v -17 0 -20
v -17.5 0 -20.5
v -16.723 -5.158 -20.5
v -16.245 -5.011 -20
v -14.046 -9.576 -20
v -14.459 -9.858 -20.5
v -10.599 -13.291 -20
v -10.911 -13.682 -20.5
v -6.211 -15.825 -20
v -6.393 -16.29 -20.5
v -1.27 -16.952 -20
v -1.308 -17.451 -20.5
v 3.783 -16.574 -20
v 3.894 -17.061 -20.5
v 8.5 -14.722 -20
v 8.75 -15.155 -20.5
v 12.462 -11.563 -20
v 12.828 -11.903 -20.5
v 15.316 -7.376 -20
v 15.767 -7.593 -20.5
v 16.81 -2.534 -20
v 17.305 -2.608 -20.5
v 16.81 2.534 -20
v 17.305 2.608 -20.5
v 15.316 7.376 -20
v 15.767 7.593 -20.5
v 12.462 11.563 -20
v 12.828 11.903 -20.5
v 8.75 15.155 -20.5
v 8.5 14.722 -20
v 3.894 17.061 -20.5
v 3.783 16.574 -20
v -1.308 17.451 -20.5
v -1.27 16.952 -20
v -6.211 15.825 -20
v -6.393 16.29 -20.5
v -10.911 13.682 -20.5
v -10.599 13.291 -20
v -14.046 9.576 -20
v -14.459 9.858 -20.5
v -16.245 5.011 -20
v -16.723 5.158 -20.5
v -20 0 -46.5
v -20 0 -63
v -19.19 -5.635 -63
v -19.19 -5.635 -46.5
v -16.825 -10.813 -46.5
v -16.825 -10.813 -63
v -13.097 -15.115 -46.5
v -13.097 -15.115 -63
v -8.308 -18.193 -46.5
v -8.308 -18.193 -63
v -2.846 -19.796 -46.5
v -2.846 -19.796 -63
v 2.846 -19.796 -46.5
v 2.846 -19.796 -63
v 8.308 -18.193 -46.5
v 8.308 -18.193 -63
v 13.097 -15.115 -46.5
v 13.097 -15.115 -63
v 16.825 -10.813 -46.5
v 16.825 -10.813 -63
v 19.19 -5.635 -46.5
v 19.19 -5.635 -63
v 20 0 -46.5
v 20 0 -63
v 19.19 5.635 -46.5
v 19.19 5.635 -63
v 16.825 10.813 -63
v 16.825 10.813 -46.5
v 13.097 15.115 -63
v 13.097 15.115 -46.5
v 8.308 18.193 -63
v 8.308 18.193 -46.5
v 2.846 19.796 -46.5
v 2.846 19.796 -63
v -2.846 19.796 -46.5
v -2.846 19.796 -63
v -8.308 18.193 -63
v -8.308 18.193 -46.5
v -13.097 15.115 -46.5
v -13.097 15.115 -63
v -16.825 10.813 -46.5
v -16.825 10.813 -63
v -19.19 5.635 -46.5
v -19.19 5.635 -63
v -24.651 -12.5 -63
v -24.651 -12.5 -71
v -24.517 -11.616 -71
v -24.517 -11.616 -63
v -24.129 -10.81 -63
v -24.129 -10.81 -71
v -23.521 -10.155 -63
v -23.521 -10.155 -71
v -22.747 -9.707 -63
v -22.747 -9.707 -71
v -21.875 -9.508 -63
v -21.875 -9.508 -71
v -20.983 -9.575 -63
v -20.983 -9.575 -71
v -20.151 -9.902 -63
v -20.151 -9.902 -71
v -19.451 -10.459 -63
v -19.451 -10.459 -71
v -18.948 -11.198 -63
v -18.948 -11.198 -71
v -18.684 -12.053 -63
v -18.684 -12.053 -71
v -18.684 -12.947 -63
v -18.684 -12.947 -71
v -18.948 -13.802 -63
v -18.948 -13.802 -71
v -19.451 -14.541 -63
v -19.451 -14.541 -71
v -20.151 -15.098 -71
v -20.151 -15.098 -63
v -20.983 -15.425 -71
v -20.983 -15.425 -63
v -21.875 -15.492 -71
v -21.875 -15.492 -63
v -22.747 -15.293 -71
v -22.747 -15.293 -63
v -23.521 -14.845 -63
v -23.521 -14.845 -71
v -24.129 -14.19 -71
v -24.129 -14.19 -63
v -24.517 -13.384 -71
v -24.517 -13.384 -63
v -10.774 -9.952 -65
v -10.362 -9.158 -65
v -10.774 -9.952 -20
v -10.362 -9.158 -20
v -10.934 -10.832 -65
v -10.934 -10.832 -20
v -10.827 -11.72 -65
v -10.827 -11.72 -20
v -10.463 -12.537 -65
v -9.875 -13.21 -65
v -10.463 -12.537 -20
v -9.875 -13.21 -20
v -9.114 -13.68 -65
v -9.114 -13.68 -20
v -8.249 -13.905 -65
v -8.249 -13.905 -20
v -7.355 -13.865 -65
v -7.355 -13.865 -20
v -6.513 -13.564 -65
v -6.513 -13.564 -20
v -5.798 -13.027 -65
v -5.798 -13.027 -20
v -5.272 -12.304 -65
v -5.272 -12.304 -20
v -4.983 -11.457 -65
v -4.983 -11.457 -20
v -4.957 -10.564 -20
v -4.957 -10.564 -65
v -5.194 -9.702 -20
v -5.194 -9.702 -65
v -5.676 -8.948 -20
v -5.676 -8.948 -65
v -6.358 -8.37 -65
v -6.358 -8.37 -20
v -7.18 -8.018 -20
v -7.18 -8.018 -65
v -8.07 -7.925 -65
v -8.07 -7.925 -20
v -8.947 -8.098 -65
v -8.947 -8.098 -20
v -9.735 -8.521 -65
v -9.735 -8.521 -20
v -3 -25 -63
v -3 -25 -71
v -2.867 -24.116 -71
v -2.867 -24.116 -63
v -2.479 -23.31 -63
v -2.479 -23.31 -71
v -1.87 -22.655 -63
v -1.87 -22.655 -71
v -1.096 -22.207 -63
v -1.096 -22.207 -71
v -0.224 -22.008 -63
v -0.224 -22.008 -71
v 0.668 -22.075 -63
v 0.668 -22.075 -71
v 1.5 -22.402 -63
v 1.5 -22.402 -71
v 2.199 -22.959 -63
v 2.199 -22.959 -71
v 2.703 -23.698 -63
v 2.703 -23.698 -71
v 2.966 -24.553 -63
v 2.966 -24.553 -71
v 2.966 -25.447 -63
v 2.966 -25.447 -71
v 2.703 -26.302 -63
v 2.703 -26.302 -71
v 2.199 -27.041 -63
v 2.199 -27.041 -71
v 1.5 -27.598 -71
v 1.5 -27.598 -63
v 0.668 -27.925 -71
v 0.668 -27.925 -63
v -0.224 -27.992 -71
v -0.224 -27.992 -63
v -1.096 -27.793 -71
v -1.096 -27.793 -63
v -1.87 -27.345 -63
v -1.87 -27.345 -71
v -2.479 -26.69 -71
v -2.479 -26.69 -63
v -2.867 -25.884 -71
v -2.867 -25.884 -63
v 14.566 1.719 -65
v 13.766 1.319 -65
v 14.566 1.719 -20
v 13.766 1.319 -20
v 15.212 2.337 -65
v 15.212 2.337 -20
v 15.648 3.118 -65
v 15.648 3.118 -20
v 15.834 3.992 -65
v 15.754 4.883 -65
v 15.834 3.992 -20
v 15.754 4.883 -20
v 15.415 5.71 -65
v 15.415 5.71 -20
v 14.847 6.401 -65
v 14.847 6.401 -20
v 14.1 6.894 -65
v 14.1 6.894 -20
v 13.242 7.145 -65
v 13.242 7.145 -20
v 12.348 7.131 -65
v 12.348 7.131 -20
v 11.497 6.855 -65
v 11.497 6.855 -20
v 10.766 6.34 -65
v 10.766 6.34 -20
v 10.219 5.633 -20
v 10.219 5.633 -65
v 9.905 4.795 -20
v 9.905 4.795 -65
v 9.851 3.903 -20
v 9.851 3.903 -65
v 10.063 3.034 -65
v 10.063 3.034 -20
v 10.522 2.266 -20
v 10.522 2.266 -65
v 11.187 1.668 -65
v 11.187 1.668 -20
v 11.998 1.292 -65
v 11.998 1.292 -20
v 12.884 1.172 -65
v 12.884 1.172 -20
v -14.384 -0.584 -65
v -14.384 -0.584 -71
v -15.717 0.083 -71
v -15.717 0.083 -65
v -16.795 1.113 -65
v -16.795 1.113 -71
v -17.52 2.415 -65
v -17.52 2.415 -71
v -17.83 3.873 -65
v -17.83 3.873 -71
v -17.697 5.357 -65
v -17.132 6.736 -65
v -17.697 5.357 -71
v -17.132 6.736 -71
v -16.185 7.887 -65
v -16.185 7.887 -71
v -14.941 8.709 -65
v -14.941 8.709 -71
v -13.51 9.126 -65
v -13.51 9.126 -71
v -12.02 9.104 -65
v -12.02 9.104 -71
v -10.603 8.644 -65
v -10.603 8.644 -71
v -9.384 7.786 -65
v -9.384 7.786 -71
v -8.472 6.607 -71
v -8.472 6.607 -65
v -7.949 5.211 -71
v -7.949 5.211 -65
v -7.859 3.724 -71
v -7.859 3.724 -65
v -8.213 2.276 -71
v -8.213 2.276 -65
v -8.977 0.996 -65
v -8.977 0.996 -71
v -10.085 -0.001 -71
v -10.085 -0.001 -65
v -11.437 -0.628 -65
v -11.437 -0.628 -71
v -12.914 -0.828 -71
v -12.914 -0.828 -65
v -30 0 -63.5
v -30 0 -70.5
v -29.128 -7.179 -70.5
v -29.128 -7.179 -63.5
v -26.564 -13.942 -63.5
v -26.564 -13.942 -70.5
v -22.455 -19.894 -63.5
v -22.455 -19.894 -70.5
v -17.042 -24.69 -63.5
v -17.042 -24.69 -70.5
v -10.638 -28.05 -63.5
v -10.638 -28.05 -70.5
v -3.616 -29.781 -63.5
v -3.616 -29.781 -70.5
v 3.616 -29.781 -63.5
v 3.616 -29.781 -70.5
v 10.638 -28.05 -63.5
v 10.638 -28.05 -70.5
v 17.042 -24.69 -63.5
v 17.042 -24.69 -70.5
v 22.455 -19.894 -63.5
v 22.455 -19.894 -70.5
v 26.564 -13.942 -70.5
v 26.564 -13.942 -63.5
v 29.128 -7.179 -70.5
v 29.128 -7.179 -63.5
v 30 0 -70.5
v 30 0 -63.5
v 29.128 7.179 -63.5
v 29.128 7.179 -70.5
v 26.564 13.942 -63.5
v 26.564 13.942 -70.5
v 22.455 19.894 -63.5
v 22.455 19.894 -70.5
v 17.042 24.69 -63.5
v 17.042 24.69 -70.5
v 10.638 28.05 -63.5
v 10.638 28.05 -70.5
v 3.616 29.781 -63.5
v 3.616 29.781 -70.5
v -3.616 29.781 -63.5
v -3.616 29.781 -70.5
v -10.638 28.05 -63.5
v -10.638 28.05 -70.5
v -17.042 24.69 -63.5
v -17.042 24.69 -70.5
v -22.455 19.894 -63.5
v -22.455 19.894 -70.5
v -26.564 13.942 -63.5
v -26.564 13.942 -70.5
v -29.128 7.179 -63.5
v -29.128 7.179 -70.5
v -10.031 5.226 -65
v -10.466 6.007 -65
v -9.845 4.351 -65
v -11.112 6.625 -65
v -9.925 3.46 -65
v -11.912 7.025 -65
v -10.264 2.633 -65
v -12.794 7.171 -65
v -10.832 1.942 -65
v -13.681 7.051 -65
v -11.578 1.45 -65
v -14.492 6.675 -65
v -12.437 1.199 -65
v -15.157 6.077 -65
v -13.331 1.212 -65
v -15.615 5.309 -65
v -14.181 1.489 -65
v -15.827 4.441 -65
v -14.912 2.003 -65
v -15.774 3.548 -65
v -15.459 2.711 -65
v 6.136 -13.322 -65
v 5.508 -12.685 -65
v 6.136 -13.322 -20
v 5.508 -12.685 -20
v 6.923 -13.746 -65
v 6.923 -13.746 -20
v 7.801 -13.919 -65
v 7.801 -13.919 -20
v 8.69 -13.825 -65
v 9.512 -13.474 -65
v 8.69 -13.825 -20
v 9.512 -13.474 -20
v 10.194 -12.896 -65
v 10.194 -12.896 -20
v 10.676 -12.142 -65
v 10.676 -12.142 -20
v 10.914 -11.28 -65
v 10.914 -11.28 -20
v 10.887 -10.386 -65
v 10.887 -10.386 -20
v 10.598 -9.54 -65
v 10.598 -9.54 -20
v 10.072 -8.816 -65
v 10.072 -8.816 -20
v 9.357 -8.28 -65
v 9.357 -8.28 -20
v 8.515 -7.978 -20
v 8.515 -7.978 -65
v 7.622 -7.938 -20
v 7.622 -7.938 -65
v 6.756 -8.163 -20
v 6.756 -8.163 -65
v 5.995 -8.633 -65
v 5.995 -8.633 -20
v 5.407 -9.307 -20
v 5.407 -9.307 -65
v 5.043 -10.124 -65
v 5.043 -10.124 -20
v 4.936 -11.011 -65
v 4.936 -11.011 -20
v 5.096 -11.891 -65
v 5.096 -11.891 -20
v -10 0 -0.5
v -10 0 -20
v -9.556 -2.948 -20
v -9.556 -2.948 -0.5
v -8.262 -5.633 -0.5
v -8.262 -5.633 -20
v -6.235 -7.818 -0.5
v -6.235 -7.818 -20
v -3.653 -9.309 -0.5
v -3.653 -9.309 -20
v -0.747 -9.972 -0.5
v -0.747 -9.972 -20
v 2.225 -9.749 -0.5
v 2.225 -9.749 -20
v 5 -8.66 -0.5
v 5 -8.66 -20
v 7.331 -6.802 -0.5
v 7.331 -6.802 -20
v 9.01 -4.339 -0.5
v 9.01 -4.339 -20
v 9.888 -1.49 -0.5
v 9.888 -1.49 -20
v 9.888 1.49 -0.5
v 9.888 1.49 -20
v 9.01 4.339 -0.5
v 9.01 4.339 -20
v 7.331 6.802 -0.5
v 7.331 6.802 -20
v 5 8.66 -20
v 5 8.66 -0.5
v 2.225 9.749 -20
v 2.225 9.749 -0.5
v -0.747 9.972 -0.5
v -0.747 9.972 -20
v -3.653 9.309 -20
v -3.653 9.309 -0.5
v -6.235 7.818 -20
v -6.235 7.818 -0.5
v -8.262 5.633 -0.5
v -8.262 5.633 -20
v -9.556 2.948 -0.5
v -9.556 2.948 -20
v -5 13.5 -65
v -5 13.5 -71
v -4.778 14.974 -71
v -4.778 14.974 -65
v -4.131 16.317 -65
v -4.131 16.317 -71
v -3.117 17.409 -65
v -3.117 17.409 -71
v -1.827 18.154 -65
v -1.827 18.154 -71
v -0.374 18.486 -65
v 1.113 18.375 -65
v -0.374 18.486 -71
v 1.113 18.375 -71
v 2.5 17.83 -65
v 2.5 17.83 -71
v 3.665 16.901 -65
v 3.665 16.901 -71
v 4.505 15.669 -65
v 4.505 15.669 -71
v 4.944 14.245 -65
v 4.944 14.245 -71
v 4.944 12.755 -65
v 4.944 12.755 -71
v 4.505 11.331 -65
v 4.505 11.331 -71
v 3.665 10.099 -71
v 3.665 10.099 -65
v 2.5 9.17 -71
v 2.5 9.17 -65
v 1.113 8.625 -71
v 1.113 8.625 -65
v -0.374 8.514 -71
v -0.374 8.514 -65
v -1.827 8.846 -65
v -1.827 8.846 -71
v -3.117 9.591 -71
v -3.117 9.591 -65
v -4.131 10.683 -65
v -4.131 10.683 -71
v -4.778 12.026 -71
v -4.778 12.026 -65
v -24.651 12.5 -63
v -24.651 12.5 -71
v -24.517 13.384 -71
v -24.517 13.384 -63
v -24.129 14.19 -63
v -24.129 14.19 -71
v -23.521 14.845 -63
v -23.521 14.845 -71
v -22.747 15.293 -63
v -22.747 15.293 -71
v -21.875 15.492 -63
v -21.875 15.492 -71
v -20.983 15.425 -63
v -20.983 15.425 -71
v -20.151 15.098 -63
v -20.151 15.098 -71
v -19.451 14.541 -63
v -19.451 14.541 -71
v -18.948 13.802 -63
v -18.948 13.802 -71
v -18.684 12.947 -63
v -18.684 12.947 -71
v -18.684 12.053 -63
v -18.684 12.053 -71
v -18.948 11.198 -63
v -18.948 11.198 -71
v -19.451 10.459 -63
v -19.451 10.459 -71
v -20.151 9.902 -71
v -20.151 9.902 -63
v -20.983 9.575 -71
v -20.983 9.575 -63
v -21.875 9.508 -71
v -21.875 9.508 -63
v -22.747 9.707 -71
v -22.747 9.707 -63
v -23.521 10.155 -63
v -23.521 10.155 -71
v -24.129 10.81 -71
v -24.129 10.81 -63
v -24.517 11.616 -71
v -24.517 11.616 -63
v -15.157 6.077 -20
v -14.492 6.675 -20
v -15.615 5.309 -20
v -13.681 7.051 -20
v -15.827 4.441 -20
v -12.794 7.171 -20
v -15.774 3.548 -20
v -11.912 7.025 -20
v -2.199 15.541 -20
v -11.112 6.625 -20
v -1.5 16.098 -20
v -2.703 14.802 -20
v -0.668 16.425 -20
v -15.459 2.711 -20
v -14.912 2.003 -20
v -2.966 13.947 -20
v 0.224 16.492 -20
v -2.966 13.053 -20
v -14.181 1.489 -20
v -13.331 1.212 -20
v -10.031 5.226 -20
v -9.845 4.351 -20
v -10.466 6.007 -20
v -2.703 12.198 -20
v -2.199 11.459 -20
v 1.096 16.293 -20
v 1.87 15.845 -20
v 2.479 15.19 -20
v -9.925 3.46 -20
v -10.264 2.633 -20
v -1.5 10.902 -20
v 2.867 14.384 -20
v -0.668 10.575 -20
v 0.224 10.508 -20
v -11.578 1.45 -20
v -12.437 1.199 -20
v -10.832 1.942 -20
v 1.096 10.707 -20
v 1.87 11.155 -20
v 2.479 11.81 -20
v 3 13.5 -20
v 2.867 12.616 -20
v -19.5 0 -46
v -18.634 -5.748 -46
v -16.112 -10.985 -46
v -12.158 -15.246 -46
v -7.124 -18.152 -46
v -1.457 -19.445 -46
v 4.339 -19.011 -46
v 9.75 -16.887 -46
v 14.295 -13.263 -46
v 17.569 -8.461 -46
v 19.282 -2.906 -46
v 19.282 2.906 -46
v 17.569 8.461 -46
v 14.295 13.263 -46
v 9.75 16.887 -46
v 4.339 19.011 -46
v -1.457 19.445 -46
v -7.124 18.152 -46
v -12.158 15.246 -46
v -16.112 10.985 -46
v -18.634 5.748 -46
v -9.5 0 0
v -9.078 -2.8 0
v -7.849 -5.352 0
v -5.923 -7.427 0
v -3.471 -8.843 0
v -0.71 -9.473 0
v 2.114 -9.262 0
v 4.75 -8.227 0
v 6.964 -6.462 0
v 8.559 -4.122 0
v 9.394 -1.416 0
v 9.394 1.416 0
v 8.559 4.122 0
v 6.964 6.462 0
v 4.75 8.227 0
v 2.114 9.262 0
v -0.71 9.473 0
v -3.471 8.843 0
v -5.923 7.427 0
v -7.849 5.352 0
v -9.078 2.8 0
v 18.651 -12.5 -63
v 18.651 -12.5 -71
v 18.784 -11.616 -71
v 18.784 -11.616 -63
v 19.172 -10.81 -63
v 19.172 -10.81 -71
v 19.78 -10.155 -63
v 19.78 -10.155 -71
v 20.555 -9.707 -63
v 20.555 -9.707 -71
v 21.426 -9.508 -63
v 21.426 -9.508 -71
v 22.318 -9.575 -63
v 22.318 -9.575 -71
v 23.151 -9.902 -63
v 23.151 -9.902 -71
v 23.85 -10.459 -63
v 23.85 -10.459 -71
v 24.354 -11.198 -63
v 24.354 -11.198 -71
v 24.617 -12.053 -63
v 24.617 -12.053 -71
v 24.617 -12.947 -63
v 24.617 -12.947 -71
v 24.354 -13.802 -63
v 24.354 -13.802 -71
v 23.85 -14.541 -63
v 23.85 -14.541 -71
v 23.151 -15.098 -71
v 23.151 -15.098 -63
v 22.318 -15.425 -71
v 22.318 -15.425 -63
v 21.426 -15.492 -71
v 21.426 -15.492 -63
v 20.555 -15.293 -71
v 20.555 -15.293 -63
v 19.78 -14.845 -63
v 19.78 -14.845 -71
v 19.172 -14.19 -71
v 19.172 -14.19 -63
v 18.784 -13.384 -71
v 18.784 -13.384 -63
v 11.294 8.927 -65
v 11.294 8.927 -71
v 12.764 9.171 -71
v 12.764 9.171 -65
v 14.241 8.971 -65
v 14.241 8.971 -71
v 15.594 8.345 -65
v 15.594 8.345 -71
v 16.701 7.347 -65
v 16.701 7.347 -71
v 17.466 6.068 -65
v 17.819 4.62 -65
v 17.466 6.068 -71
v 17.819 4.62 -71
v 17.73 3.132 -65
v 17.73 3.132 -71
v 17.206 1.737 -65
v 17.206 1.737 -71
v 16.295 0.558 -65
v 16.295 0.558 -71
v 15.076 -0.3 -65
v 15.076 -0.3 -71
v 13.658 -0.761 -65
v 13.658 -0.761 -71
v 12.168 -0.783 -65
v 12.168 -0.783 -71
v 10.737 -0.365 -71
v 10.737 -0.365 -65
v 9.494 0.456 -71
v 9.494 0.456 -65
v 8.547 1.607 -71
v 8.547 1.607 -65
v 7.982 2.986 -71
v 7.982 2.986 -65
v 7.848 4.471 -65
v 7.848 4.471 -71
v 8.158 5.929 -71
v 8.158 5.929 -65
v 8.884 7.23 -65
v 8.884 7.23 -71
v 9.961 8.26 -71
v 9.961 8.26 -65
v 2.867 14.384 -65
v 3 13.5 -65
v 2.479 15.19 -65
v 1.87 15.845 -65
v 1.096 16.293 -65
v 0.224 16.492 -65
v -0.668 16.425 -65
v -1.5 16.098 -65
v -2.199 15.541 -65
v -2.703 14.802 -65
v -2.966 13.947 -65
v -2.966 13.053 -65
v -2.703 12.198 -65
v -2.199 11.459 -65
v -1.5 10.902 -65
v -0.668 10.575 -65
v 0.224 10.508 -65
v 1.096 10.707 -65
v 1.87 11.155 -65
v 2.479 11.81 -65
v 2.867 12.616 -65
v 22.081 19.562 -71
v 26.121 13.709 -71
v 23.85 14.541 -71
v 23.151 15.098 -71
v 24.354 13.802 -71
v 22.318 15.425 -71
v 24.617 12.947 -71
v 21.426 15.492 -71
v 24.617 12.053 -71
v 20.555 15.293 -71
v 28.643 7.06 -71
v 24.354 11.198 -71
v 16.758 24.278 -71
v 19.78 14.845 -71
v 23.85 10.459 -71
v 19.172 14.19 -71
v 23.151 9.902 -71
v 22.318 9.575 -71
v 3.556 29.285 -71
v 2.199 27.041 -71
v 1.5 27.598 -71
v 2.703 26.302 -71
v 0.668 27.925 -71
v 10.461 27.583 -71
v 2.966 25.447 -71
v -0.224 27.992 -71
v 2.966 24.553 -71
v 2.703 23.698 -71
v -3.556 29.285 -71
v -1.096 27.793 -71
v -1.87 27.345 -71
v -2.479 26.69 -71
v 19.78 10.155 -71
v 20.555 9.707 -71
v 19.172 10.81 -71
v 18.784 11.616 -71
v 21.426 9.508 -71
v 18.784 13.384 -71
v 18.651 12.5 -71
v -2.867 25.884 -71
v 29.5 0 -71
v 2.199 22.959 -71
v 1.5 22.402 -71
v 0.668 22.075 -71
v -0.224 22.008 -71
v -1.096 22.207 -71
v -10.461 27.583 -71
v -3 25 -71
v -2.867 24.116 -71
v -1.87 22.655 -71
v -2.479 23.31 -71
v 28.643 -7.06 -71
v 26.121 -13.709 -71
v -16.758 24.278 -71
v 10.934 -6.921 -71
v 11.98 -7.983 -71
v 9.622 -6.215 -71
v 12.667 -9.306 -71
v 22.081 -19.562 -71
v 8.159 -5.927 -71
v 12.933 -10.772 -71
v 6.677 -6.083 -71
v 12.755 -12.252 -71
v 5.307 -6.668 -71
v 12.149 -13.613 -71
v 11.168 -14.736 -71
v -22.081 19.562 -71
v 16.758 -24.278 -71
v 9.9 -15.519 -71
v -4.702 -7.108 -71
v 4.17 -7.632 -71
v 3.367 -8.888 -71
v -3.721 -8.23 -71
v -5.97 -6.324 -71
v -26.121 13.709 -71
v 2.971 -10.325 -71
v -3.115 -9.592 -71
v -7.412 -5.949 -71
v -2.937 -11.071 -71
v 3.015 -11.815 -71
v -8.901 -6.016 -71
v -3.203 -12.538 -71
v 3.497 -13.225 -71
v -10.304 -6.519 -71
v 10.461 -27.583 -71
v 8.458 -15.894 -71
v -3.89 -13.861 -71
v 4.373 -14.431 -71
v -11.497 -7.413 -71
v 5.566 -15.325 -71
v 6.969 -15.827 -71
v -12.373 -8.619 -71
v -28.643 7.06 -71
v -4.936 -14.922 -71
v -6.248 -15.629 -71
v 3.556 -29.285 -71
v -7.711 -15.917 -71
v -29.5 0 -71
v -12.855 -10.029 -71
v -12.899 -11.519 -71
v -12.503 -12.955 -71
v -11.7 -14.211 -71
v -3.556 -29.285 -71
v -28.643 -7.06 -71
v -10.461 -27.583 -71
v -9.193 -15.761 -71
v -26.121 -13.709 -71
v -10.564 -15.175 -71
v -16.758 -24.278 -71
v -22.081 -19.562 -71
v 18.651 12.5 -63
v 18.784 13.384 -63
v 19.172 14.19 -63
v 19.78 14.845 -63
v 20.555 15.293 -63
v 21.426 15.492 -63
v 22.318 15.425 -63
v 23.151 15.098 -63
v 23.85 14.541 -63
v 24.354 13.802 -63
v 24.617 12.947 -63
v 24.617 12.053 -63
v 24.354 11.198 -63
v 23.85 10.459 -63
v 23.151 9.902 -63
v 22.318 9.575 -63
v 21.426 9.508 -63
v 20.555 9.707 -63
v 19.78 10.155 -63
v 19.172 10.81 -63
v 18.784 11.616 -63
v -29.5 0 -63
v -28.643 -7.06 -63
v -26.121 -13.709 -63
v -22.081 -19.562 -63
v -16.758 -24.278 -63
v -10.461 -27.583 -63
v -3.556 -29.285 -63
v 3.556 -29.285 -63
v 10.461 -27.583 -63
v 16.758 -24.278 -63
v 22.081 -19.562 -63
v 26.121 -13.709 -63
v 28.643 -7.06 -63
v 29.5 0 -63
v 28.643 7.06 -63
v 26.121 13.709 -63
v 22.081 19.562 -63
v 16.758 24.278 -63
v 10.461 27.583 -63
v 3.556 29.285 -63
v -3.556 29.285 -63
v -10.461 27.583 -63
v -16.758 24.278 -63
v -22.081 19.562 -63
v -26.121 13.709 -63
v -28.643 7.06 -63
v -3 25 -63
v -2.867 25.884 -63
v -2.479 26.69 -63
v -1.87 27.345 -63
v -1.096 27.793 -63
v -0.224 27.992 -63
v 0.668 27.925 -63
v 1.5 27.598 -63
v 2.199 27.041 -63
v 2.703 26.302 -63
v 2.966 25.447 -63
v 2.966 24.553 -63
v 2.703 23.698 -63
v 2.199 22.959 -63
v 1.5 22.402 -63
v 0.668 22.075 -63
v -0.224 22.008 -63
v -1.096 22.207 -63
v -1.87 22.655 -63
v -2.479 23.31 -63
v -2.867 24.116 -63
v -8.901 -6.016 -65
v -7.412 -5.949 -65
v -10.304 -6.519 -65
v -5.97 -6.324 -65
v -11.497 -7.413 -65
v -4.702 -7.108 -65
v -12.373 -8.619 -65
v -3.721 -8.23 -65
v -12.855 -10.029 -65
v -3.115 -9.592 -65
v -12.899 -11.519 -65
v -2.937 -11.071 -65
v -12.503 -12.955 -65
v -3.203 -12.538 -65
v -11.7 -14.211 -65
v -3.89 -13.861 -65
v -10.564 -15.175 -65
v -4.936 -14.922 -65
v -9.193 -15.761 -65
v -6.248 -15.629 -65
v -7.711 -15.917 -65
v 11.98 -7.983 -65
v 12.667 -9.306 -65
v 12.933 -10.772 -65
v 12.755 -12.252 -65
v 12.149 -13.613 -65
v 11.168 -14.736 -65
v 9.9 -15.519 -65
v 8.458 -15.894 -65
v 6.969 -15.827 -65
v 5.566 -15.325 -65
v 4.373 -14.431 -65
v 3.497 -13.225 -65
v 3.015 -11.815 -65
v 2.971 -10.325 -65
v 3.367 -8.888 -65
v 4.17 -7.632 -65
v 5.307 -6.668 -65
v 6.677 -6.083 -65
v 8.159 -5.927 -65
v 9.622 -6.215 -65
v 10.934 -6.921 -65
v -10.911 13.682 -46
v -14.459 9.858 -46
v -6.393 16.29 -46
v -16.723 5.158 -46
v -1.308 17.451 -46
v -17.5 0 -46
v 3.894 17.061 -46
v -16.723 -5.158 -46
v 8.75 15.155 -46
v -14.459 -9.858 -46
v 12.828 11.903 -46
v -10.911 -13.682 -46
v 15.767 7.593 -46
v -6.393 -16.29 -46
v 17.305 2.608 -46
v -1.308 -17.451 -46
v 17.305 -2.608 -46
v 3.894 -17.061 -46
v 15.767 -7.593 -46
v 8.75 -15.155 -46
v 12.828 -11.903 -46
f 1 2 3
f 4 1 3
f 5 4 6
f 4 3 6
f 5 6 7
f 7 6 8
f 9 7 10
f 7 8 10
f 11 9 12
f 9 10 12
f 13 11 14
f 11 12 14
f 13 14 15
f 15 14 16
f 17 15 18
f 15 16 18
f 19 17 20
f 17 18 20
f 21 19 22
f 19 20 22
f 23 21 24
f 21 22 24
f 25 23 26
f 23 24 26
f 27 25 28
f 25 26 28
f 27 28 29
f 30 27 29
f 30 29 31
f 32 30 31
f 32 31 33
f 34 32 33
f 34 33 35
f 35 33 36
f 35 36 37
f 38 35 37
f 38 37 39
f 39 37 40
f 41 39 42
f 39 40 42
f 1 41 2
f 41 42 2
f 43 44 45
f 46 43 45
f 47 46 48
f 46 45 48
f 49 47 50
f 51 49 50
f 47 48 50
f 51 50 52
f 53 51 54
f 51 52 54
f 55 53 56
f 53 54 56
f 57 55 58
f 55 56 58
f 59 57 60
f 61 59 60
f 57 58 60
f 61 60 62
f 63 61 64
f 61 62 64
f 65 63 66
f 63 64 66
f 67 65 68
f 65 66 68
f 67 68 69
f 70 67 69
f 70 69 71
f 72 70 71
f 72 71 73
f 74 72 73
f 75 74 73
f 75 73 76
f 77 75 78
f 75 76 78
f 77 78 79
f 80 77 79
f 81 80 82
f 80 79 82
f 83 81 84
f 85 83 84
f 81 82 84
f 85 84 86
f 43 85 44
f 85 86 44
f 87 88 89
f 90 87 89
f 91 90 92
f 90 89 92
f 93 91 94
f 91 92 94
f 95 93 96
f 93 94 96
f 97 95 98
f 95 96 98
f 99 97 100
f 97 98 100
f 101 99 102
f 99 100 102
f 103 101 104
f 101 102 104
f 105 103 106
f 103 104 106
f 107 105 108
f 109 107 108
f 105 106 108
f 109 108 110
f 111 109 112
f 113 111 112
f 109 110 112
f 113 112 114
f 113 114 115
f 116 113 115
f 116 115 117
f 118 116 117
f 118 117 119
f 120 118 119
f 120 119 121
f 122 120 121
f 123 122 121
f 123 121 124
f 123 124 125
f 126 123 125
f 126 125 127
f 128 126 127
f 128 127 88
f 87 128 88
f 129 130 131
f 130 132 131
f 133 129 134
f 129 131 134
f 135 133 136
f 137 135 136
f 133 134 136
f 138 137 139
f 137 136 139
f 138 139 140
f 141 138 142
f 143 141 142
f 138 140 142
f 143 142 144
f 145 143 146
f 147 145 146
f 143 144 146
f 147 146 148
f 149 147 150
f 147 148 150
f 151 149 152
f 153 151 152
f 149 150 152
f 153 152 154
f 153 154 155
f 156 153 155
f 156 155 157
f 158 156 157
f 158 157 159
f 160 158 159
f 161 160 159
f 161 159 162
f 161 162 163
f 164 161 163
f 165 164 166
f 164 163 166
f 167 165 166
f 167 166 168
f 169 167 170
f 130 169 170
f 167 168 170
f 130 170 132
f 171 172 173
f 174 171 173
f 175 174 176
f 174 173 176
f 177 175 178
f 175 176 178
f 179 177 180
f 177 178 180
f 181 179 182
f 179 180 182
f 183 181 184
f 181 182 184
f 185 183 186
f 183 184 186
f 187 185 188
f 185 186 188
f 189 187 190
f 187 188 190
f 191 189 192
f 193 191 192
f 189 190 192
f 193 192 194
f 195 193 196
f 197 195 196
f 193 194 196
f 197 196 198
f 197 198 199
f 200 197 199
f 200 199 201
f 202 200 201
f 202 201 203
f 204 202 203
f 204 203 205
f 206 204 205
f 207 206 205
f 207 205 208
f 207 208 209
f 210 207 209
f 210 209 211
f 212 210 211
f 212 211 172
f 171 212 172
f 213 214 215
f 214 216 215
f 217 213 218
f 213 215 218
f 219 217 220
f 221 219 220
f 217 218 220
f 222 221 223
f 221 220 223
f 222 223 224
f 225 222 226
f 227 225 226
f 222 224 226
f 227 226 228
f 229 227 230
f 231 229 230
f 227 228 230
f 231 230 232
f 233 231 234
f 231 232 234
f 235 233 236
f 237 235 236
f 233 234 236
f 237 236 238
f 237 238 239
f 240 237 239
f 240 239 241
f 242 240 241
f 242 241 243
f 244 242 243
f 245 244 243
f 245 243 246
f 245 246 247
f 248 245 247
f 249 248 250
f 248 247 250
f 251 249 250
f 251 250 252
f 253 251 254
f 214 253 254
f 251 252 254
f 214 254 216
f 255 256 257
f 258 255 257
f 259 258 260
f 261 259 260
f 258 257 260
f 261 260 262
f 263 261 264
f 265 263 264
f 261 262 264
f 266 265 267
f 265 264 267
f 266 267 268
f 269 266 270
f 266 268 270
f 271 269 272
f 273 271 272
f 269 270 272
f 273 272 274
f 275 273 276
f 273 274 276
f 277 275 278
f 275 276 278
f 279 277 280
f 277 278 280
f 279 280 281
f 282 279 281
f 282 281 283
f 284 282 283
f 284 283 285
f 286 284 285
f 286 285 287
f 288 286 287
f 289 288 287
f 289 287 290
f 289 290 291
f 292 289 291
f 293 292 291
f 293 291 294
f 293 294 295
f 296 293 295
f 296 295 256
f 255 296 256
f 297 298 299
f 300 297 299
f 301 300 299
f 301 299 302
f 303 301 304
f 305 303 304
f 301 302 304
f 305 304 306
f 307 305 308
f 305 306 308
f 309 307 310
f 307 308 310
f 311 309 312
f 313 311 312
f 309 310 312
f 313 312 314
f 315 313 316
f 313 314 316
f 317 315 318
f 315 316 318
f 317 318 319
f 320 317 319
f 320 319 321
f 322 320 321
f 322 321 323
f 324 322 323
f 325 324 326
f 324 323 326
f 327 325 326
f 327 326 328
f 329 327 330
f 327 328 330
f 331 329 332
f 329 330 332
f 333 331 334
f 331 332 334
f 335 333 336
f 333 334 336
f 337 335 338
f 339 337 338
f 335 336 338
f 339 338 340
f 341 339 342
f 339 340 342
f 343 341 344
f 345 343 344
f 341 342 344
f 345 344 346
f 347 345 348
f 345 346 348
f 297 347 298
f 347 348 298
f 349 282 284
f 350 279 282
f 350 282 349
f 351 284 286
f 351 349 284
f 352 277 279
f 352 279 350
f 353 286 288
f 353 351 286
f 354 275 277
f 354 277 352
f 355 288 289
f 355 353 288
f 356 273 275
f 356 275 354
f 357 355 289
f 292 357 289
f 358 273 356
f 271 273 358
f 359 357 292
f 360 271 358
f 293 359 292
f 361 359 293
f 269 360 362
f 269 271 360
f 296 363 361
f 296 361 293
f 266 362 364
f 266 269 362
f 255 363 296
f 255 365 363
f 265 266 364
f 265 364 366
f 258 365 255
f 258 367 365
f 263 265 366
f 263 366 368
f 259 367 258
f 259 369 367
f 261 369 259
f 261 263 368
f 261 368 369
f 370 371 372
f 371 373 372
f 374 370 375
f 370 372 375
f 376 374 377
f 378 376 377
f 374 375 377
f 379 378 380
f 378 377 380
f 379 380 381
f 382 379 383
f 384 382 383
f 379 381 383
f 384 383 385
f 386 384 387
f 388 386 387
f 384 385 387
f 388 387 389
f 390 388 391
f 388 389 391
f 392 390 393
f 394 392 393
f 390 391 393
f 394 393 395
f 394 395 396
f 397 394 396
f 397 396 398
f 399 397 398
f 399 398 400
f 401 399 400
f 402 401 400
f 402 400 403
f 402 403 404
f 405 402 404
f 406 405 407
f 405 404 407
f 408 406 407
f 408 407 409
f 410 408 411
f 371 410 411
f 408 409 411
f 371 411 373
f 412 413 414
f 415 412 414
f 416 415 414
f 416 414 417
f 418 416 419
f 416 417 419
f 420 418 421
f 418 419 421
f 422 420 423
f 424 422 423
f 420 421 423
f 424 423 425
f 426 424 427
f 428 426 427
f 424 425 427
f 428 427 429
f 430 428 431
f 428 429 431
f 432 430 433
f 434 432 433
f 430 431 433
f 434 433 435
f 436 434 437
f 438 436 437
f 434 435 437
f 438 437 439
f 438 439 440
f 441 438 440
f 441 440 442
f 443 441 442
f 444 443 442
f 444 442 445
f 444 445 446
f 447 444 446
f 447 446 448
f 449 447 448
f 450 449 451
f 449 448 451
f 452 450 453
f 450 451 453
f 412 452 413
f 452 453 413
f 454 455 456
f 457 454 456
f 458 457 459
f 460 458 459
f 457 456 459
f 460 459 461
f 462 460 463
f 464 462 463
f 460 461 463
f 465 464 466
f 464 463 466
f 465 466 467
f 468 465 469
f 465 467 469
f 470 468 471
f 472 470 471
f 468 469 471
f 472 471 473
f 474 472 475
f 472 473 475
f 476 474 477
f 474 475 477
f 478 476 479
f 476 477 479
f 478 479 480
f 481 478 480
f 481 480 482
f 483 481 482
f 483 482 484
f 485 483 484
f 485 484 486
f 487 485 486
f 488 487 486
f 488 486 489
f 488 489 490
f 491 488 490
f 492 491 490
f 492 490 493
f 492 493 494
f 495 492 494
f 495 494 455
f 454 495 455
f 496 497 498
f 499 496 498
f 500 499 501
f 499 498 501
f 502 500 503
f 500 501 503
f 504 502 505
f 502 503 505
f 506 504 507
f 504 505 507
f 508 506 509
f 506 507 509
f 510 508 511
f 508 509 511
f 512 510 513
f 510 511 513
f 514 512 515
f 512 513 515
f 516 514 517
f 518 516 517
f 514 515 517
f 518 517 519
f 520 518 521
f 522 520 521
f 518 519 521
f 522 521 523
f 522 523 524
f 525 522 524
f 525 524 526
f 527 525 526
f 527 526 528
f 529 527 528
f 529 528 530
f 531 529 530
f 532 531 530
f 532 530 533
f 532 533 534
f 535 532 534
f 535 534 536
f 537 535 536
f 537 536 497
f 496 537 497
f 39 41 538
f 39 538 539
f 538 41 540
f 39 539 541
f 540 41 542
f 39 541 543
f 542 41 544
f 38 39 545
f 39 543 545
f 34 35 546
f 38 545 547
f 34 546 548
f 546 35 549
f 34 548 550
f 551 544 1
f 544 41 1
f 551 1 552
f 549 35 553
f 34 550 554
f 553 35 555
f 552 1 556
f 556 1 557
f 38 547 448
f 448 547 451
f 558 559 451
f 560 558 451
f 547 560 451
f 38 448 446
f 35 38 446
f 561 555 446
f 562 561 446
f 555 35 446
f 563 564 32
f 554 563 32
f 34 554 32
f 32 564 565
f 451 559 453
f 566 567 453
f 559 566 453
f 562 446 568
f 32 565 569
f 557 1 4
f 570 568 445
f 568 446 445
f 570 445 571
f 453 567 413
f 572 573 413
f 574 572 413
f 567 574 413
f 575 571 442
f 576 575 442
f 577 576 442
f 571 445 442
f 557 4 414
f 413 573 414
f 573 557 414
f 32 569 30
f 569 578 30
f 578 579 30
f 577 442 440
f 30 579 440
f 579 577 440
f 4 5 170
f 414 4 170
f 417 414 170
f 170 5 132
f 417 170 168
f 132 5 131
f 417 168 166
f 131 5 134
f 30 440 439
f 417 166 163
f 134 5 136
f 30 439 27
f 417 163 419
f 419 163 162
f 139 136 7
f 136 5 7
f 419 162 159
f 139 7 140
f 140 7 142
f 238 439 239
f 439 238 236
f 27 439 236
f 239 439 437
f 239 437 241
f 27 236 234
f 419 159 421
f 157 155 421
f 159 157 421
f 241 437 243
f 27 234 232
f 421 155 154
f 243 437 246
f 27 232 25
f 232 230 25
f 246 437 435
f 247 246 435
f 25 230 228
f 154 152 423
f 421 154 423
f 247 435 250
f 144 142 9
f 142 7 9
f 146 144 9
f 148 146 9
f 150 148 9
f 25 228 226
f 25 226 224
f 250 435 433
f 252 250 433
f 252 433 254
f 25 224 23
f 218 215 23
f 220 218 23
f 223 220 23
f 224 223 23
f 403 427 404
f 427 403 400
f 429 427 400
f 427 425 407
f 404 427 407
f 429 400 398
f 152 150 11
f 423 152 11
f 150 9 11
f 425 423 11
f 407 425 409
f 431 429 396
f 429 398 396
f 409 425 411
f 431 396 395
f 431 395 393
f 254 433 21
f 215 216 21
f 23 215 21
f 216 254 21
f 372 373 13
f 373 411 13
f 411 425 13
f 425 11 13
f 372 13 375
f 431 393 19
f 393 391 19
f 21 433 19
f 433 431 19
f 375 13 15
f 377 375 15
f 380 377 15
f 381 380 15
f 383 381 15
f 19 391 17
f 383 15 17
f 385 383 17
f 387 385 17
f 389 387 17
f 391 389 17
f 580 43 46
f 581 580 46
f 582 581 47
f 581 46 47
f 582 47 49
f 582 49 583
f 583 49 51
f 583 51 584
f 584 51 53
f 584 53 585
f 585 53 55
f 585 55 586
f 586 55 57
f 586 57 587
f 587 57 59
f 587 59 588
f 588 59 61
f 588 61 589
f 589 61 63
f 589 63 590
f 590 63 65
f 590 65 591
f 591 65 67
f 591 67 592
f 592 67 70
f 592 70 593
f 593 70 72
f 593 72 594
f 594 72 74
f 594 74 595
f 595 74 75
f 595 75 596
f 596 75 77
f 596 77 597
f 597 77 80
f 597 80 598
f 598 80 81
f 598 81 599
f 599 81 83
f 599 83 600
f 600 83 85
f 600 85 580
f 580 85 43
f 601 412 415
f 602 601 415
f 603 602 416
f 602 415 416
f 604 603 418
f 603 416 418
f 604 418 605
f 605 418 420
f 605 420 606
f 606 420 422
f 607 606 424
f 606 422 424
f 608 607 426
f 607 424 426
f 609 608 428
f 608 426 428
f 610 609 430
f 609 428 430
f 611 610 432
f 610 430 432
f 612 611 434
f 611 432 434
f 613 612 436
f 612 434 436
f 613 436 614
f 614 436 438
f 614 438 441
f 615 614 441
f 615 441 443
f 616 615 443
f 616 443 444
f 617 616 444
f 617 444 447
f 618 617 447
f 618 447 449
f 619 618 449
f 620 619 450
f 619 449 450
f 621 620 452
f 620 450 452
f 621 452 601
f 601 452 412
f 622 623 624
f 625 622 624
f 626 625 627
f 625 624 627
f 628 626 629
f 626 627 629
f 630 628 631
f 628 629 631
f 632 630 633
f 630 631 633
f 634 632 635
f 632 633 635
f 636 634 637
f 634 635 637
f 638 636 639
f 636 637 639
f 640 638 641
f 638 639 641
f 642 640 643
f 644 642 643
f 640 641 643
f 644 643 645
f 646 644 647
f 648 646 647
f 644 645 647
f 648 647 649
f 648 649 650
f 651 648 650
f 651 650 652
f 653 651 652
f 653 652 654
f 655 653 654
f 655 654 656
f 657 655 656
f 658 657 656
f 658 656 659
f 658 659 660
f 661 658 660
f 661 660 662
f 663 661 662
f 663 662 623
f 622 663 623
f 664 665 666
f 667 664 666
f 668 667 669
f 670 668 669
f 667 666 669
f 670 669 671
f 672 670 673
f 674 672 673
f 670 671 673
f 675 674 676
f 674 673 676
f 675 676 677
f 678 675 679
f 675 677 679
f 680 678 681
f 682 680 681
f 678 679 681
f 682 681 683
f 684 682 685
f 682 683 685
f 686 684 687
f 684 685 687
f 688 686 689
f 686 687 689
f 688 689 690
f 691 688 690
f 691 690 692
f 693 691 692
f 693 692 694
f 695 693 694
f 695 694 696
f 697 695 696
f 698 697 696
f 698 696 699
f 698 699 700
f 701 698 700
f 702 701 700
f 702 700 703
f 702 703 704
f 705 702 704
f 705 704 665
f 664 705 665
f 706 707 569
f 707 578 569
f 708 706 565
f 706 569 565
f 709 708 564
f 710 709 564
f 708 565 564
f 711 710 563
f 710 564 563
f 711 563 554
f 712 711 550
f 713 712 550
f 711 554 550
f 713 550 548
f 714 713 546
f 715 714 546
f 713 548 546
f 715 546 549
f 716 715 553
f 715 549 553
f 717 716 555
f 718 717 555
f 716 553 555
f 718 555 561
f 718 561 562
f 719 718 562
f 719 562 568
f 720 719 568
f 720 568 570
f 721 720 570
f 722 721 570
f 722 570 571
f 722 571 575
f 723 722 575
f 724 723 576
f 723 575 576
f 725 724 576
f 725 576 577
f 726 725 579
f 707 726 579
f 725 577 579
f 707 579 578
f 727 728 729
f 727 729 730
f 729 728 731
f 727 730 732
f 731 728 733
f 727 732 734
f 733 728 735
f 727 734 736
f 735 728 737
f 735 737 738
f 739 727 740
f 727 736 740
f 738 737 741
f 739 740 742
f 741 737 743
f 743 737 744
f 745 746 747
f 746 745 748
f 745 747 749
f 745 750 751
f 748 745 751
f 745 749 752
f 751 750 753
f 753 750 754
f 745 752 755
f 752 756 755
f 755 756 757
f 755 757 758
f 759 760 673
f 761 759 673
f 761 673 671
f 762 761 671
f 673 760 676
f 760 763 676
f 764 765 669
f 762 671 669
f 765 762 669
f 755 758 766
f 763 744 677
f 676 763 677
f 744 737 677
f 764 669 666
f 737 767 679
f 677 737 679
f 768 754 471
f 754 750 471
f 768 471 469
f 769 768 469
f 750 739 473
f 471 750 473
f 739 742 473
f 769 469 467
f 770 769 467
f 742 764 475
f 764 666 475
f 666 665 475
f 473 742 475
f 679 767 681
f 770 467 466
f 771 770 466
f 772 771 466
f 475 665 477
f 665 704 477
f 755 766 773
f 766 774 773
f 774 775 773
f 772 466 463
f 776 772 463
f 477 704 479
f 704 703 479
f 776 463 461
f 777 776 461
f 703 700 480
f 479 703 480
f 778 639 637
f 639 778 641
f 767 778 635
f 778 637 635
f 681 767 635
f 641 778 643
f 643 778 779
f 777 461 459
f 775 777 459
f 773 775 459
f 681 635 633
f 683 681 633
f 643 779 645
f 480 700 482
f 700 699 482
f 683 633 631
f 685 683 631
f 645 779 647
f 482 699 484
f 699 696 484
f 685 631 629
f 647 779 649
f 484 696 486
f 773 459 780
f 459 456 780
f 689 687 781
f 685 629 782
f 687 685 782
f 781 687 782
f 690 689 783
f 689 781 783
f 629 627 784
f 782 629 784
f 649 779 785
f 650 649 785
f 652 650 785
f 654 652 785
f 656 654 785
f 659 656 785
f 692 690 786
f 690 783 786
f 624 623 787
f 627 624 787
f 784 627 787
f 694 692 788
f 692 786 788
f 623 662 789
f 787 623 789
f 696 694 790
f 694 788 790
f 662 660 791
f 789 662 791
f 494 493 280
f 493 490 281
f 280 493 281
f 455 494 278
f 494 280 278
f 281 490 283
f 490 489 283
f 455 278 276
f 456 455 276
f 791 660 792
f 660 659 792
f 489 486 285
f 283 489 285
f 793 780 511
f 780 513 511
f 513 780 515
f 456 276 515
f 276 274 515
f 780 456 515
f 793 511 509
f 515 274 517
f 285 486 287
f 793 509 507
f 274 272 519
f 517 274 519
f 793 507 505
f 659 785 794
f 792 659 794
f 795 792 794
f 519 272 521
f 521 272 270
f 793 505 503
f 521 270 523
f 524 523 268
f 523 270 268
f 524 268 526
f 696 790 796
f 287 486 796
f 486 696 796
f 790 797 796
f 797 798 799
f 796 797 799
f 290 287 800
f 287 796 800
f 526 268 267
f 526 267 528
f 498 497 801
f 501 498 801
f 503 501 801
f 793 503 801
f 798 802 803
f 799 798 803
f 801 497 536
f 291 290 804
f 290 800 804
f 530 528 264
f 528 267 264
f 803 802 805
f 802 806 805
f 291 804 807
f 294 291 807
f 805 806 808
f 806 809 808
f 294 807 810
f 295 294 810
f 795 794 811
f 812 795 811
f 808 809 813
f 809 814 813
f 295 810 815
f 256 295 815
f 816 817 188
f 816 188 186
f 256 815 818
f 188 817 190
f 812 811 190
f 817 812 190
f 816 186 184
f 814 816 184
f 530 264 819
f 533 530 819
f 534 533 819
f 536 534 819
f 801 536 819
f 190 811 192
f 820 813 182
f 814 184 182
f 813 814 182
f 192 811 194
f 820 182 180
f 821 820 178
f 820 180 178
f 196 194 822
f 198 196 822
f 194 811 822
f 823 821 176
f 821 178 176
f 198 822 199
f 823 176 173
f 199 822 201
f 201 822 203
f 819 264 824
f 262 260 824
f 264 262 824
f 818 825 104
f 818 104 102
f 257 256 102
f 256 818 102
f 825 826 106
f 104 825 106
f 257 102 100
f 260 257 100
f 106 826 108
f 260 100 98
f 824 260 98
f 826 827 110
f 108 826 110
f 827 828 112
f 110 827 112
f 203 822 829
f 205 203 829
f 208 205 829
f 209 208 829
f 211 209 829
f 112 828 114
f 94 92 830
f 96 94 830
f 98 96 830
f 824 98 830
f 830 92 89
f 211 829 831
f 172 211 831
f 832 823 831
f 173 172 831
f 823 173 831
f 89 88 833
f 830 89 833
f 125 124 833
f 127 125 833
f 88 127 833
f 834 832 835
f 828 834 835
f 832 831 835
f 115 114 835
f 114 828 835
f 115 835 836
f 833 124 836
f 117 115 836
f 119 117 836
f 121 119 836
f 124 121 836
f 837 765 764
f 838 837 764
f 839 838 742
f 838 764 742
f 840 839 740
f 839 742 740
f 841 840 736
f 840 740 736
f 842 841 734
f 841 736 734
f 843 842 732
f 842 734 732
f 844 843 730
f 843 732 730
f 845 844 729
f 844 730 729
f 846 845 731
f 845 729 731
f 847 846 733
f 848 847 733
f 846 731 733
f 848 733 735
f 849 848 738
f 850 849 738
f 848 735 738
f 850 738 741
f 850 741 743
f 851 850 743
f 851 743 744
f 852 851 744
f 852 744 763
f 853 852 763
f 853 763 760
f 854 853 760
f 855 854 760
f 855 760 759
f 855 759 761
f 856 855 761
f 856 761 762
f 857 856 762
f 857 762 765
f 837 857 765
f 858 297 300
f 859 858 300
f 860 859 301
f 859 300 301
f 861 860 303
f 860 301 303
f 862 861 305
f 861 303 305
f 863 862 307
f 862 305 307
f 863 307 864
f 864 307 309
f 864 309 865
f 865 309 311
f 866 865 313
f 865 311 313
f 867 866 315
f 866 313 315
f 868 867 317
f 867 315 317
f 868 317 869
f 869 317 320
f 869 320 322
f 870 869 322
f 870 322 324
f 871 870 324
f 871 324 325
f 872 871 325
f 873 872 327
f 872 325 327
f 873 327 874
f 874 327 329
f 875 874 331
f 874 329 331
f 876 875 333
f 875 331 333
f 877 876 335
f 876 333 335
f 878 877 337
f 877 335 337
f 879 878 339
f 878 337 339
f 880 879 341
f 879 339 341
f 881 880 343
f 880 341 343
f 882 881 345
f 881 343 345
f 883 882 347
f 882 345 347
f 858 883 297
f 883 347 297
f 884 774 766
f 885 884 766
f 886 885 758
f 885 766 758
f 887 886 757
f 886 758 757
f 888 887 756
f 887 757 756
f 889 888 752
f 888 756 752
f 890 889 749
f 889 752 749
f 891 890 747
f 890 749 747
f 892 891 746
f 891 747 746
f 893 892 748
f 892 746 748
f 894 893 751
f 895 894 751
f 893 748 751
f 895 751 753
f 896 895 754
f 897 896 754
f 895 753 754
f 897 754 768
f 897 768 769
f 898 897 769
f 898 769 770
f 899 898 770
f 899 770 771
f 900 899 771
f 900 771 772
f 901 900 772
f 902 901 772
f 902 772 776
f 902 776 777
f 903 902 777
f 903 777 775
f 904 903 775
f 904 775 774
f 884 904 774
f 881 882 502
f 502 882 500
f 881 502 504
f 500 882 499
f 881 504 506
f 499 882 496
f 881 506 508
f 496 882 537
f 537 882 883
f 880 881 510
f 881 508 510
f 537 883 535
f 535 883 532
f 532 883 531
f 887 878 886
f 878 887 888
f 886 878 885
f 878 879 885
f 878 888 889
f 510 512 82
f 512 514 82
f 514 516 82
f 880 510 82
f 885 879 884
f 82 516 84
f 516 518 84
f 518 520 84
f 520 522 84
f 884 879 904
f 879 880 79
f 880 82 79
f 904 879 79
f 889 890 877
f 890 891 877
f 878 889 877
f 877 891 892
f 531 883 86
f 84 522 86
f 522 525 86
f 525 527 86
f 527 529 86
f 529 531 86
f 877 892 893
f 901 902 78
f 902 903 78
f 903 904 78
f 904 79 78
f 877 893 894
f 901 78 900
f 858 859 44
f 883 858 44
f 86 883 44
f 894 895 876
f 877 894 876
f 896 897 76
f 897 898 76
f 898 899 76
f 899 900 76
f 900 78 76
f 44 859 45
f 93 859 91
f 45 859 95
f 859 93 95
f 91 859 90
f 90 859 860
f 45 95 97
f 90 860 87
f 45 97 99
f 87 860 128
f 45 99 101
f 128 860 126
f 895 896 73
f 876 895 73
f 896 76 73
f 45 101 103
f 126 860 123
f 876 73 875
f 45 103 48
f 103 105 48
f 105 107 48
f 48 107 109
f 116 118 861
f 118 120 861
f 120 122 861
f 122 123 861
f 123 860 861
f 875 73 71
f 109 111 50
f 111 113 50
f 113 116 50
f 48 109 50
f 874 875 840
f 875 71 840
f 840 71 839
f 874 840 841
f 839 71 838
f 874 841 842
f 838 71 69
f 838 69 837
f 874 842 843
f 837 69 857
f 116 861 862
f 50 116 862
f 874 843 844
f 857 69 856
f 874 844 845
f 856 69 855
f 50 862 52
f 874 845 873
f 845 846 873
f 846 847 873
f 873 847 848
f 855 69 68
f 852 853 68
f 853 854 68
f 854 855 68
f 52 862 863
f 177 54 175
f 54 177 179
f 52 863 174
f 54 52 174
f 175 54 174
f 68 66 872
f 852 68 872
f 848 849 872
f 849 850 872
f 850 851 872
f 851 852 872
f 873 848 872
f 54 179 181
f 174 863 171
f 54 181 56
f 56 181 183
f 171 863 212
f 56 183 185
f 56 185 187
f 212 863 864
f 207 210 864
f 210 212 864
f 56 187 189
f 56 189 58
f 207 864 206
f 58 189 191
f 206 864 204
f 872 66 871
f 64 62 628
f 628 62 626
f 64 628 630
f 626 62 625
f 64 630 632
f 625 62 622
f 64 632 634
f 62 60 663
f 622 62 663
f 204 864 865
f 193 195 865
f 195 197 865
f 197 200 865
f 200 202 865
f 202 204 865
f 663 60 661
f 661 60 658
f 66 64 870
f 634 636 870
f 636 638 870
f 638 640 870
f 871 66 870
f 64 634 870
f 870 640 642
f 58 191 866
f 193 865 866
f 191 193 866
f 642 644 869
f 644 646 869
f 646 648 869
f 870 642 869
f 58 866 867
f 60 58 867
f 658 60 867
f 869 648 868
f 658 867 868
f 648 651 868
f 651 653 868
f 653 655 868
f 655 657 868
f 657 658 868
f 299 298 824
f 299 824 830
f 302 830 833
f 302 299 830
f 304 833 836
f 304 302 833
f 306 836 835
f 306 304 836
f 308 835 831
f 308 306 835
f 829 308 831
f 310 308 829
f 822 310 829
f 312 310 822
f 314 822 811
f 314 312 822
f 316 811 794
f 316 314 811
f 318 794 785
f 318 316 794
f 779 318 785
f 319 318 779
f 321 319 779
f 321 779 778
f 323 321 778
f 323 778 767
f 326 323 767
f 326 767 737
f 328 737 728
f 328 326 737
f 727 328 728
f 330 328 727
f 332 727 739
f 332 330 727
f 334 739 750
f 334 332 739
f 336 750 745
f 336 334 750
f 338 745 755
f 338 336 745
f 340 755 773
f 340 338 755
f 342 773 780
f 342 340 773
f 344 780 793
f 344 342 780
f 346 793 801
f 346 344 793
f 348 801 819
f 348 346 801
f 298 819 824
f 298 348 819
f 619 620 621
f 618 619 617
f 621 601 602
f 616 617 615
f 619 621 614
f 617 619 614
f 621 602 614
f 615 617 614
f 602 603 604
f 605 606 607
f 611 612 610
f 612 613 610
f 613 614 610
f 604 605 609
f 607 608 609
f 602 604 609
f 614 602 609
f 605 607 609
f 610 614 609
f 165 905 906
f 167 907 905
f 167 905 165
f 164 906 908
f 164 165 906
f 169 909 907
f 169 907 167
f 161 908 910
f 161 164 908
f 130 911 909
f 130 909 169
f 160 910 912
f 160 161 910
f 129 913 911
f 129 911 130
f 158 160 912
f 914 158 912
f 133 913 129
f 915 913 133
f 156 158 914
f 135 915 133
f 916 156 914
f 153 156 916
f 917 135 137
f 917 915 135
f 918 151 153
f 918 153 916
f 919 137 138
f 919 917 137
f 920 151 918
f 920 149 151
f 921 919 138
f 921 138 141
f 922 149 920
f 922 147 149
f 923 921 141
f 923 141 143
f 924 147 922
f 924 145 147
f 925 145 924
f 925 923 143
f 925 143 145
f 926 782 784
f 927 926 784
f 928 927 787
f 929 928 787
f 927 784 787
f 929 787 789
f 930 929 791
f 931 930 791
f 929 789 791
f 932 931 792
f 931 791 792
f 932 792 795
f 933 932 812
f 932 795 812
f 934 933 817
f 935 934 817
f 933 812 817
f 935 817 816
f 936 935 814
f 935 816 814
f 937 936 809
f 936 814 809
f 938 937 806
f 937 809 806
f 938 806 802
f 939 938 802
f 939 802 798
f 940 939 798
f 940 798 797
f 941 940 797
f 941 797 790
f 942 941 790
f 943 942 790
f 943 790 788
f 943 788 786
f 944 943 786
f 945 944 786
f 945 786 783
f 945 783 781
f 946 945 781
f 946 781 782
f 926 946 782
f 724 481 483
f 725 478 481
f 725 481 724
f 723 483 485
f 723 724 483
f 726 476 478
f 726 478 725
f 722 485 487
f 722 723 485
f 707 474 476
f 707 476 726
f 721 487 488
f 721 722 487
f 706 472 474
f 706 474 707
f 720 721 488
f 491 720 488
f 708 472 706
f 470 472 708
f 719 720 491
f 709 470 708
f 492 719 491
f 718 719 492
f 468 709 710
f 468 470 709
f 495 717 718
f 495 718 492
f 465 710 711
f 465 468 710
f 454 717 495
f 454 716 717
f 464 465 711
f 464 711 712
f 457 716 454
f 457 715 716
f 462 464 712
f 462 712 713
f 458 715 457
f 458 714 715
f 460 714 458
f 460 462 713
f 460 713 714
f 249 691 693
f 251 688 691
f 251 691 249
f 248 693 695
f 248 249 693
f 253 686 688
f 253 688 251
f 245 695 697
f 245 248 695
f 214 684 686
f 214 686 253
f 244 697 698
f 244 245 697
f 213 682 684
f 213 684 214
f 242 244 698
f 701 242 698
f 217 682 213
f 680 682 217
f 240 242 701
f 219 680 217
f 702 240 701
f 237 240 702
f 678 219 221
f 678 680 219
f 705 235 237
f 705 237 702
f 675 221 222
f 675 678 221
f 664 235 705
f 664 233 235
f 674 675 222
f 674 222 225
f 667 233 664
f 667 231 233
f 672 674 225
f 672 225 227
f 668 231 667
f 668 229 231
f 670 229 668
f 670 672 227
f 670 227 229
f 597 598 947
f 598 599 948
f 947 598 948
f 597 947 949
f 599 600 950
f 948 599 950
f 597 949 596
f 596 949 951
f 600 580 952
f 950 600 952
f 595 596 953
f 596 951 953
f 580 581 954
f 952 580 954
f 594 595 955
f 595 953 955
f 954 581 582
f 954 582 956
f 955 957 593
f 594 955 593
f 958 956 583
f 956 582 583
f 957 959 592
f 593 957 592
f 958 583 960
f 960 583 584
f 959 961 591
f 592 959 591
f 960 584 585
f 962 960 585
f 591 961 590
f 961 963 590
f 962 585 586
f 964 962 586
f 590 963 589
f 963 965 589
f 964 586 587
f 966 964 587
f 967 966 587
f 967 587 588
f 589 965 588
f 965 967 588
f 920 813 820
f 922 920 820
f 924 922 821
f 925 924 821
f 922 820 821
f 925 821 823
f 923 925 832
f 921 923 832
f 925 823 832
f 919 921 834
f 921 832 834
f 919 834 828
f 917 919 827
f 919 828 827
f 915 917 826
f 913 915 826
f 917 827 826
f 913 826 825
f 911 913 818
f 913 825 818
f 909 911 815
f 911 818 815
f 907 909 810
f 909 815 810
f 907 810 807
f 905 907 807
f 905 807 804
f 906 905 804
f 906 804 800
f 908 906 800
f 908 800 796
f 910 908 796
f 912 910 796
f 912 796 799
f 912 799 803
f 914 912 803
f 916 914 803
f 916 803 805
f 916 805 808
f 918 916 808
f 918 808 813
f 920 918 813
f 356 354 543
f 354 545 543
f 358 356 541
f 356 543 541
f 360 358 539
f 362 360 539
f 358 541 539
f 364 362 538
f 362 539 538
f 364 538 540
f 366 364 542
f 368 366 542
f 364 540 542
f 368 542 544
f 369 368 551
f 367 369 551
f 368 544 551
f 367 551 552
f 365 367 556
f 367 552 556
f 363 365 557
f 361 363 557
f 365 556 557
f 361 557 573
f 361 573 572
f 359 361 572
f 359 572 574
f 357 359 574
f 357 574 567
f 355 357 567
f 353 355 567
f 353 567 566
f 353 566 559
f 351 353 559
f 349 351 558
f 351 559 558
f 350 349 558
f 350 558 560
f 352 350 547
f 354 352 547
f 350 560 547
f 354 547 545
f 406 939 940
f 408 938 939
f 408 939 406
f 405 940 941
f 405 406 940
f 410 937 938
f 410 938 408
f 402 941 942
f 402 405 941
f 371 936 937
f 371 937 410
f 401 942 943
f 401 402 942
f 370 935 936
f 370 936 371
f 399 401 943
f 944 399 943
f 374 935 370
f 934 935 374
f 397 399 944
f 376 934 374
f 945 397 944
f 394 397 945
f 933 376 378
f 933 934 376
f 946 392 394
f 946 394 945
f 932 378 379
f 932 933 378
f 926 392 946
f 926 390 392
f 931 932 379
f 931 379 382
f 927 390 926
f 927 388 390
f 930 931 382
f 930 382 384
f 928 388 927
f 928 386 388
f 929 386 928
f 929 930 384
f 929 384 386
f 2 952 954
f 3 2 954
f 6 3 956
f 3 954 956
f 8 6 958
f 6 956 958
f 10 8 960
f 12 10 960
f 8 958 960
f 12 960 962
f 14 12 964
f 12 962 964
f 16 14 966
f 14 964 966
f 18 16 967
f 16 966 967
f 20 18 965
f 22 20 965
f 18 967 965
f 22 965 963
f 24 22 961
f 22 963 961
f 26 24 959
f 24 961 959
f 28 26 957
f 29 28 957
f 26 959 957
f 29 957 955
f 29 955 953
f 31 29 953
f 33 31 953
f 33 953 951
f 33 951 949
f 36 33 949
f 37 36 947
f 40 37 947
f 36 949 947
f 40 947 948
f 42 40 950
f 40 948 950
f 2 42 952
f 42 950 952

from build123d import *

# Parameters (mm, degrees)
SKETCH_2_R                   = 3
CUT_EXTRUDE_1_DEPTH          = 10
HOLE_WIZARD_M6_2_D           = 6
HOLE_WIZARD_M6_2_CBORE_D     = 10
HOLE_WIZARD_M6_2_CBORE_DEPTH = 6
PATTERN_CIRCULAR_1_COUNT     = 5
CHAMFER_1_SIZE               = 0.5


with BuildPart() as part:
    # 草图1 → 旋转1 (revolve)
    with BuildSketch(Plane(origin=(0, 0, 0), x_dir=(0, 0, -1), z_dir=(1, 0, 0)), mode=Mode.PRIVATE) as revolve_1_sk:
        Polygon((0, 0), (0, 10), (20, 10), (20, 17.5), (46, 17.5), (46, 20), (63, 20), (63, 30), (71, 30), (71, 0), align=None)
    revolve(revolve_1_sk.sketch.rotate(Axis((0, 0, 0), (0, 0, 1)), 90), axis=Axis((0, 0, 0), (0, 0, 1)))

    # 草图2 → 切除-拉伸1 (cut)
    with BuildSketch(Plane(origin=(0, 0, -71), x_dir=(-1, 0, 0), z_dir=(0, 0, -1))):
        with Locations((0, 25)):
            Circle(SKETCH_2_R)
        with Locations((21.650635095, 12.5)):
            Circle(SKETCH_2_R)
        with Locations((21.650635095, -12.5)):
            Circle(SKETCH_2_R)
        with Locations((0, -25)):
            Circle(SKETCH_2_R)
        with Locations((-21.650635095, -12.5)):
            Circle(SKETCH_2_R)
        with Locations((-21.650635095, 12.5)):
            Circle(SKETCH_2_R)
    extrude(amount=-CUT_EXTRUDE_1_DEPTH, mode=Mode.SUBTRACT)

    # M6 六角头螺栓的柱形沉头孔2 (through all)
    with Locations(Plane(origin=(0, 0, -71), x_dir=(-1, 0, 0), z_dir=(0, 0, -1))):
        with Locations((0, 13.5)):
            hole_wizard_m6_2 = CounterBoreHole(HOLE_WIZARD_M6_2_D / 2, HOLE_WIZARD_M6_2_CBORE_D / 2, HOLE_WIZARD_M6_2_CBORE_DEPTH)

    # 阵列(圆周)1: M6 六角头螺栓的柱形沉头孔2 ×5 about axis
    pattern_circular_1_axis = Axis((0, 0, 0), (0, 0, 1))
    for i in range(1, PATTERN_CIRCULAR_1_COUNT):
        add(hole_wizard_m6_2.rotate(pattern_circular_1_axis, i * 360 / PATTERN_CIRCULAR_1_COUNT), mode=Mode.SUBTRACT)

    # 倒角1
    chamfer_1_edges = [part.edges().sort_by_distance(p)[0] for p in [
        (17.5, 0, -20),
        (10, 0, 0),
        (30, 0, -71),
        (30, 0, -63),
        (20, 0, -46),
    ]]
    chamfer(chamfer_1_edges, length=CHAMFER_1_SIZE)


solid = part.part
